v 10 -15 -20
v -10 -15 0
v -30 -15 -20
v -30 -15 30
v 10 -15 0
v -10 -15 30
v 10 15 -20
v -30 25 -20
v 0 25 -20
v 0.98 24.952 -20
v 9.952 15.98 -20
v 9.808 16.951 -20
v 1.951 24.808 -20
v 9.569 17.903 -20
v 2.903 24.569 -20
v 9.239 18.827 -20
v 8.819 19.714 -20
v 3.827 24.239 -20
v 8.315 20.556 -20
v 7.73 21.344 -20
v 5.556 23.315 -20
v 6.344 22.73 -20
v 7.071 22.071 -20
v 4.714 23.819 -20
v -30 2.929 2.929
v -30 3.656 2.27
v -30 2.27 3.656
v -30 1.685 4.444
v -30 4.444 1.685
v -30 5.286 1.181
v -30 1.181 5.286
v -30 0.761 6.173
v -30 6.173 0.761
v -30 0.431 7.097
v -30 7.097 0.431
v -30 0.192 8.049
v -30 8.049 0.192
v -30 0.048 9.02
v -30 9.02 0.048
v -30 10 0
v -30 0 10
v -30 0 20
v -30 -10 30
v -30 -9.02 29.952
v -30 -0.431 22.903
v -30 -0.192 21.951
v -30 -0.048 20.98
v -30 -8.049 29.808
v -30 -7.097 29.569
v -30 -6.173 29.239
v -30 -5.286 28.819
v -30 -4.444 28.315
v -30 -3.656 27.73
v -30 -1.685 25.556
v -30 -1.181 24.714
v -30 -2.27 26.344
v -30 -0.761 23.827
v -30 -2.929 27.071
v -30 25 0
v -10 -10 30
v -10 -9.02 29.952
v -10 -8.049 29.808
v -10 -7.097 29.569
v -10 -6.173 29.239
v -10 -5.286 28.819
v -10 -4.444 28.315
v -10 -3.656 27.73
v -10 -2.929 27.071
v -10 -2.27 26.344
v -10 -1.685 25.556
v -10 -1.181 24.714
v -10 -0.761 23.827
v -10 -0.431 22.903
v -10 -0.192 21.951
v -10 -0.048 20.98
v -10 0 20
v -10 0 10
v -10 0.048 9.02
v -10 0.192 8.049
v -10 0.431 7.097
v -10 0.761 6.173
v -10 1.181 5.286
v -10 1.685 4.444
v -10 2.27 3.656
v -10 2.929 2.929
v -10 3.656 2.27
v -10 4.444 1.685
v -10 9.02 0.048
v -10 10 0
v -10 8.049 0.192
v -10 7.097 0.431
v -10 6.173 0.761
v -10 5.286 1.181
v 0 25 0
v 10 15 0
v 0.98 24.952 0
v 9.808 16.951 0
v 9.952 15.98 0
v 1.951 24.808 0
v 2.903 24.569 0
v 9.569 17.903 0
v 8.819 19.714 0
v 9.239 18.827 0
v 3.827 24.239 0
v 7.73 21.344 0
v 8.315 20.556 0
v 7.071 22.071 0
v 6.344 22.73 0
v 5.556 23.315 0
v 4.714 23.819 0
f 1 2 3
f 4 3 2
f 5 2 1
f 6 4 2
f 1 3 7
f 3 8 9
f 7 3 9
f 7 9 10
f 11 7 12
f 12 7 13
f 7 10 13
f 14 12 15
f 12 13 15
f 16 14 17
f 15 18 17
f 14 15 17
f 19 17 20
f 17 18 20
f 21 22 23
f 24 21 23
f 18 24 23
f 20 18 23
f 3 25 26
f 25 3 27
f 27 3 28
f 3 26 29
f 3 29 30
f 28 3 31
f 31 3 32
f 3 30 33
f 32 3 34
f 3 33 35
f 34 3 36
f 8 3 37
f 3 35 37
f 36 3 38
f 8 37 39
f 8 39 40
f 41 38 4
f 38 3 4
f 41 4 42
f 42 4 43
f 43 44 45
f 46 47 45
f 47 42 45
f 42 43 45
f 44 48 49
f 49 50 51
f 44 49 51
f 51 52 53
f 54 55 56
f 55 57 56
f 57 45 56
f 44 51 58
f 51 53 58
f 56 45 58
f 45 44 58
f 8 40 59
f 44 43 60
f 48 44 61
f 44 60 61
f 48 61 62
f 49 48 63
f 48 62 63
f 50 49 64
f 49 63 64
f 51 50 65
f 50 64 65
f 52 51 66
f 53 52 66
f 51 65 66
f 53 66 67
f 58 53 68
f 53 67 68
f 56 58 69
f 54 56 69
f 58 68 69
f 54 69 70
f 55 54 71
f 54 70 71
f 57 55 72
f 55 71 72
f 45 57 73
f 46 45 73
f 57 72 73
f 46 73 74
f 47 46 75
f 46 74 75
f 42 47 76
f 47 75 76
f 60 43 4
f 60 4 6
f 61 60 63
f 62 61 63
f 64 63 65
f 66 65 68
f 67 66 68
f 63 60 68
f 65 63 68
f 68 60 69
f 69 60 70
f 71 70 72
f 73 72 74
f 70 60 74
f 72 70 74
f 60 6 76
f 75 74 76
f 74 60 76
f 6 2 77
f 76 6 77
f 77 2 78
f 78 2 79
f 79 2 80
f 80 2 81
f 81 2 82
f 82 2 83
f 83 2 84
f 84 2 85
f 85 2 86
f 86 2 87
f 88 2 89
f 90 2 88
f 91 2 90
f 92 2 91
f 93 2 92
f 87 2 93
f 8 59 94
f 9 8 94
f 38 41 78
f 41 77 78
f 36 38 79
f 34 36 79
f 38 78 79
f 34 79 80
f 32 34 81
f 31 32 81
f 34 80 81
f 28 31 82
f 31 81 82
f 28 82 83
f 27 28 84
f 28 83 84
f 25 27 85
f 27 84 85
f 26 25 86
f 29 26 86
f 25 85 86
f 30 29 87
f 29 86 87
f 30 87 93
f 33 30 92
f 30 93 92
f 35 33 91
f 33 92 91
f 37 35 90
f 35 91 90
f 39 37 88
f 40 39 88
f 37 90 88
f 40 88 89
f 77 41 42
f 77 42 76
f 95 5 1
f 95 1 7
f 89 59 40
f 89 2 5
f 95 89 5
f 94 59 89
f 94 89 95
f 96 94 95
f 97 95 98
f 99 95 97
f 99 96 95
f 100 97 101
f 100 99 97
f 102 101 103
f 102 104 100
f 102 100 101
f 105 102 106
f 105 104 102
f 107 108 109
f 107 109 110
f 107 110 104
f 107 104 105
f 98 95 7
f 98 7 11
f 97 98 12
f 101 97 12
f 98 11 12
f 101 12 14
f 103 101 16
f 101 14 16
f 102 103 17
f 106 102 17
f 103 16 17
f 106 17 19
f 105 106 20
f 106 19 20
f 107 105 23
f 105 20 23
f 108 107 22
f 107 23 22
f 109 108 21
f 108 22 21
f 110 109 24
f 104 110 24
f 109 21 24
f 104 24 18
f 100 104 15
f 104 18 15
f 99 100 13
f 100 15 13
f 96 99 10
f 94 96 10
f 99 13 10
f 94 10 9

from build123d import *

# Parameters (mm, degrees)
SKETCH1_W           = 20
SKETCH1_H           = 15
BOSS_EXTRUDE1_DEPTH = 30
SKETCH2_W           = 40
SKETCH2_H           = 40
BOSS_EXTRUDE2_DEPTH = 20
FILLET1_R           = 10


with BuildPart() as part:
    # Sketch1 → Boss-Extrude1 (new body)
    with BuildSketch(Plane.XY):
        with Locations((-20, -7.5)):
            Rectangle(SKETCH1_W, SKETCH1_H)
    extrude(amount=BOSS_EXTRUDE1_DEPTH)

    # Sketch2 → Boss-Extrude2 (add)
    with BuildSketch(Plane.XY):
        with Locations((-10, 5)):
            Rectangle(SKETCH2_W, SKETCH2_H)
    extrude(amount=-BOSS_EXTRUDE2_DEPTH)

    # Fillet1
    fillet1_edges = [part.edges().sort_by_distance(p)[0] for p in [
        (10, 25, -10),
        (-20, 0, 30),
        (-20, 0, 0),
    ]]
    fillet(fillet1_edges, radius=FILLET1_R)


solid = part.part
